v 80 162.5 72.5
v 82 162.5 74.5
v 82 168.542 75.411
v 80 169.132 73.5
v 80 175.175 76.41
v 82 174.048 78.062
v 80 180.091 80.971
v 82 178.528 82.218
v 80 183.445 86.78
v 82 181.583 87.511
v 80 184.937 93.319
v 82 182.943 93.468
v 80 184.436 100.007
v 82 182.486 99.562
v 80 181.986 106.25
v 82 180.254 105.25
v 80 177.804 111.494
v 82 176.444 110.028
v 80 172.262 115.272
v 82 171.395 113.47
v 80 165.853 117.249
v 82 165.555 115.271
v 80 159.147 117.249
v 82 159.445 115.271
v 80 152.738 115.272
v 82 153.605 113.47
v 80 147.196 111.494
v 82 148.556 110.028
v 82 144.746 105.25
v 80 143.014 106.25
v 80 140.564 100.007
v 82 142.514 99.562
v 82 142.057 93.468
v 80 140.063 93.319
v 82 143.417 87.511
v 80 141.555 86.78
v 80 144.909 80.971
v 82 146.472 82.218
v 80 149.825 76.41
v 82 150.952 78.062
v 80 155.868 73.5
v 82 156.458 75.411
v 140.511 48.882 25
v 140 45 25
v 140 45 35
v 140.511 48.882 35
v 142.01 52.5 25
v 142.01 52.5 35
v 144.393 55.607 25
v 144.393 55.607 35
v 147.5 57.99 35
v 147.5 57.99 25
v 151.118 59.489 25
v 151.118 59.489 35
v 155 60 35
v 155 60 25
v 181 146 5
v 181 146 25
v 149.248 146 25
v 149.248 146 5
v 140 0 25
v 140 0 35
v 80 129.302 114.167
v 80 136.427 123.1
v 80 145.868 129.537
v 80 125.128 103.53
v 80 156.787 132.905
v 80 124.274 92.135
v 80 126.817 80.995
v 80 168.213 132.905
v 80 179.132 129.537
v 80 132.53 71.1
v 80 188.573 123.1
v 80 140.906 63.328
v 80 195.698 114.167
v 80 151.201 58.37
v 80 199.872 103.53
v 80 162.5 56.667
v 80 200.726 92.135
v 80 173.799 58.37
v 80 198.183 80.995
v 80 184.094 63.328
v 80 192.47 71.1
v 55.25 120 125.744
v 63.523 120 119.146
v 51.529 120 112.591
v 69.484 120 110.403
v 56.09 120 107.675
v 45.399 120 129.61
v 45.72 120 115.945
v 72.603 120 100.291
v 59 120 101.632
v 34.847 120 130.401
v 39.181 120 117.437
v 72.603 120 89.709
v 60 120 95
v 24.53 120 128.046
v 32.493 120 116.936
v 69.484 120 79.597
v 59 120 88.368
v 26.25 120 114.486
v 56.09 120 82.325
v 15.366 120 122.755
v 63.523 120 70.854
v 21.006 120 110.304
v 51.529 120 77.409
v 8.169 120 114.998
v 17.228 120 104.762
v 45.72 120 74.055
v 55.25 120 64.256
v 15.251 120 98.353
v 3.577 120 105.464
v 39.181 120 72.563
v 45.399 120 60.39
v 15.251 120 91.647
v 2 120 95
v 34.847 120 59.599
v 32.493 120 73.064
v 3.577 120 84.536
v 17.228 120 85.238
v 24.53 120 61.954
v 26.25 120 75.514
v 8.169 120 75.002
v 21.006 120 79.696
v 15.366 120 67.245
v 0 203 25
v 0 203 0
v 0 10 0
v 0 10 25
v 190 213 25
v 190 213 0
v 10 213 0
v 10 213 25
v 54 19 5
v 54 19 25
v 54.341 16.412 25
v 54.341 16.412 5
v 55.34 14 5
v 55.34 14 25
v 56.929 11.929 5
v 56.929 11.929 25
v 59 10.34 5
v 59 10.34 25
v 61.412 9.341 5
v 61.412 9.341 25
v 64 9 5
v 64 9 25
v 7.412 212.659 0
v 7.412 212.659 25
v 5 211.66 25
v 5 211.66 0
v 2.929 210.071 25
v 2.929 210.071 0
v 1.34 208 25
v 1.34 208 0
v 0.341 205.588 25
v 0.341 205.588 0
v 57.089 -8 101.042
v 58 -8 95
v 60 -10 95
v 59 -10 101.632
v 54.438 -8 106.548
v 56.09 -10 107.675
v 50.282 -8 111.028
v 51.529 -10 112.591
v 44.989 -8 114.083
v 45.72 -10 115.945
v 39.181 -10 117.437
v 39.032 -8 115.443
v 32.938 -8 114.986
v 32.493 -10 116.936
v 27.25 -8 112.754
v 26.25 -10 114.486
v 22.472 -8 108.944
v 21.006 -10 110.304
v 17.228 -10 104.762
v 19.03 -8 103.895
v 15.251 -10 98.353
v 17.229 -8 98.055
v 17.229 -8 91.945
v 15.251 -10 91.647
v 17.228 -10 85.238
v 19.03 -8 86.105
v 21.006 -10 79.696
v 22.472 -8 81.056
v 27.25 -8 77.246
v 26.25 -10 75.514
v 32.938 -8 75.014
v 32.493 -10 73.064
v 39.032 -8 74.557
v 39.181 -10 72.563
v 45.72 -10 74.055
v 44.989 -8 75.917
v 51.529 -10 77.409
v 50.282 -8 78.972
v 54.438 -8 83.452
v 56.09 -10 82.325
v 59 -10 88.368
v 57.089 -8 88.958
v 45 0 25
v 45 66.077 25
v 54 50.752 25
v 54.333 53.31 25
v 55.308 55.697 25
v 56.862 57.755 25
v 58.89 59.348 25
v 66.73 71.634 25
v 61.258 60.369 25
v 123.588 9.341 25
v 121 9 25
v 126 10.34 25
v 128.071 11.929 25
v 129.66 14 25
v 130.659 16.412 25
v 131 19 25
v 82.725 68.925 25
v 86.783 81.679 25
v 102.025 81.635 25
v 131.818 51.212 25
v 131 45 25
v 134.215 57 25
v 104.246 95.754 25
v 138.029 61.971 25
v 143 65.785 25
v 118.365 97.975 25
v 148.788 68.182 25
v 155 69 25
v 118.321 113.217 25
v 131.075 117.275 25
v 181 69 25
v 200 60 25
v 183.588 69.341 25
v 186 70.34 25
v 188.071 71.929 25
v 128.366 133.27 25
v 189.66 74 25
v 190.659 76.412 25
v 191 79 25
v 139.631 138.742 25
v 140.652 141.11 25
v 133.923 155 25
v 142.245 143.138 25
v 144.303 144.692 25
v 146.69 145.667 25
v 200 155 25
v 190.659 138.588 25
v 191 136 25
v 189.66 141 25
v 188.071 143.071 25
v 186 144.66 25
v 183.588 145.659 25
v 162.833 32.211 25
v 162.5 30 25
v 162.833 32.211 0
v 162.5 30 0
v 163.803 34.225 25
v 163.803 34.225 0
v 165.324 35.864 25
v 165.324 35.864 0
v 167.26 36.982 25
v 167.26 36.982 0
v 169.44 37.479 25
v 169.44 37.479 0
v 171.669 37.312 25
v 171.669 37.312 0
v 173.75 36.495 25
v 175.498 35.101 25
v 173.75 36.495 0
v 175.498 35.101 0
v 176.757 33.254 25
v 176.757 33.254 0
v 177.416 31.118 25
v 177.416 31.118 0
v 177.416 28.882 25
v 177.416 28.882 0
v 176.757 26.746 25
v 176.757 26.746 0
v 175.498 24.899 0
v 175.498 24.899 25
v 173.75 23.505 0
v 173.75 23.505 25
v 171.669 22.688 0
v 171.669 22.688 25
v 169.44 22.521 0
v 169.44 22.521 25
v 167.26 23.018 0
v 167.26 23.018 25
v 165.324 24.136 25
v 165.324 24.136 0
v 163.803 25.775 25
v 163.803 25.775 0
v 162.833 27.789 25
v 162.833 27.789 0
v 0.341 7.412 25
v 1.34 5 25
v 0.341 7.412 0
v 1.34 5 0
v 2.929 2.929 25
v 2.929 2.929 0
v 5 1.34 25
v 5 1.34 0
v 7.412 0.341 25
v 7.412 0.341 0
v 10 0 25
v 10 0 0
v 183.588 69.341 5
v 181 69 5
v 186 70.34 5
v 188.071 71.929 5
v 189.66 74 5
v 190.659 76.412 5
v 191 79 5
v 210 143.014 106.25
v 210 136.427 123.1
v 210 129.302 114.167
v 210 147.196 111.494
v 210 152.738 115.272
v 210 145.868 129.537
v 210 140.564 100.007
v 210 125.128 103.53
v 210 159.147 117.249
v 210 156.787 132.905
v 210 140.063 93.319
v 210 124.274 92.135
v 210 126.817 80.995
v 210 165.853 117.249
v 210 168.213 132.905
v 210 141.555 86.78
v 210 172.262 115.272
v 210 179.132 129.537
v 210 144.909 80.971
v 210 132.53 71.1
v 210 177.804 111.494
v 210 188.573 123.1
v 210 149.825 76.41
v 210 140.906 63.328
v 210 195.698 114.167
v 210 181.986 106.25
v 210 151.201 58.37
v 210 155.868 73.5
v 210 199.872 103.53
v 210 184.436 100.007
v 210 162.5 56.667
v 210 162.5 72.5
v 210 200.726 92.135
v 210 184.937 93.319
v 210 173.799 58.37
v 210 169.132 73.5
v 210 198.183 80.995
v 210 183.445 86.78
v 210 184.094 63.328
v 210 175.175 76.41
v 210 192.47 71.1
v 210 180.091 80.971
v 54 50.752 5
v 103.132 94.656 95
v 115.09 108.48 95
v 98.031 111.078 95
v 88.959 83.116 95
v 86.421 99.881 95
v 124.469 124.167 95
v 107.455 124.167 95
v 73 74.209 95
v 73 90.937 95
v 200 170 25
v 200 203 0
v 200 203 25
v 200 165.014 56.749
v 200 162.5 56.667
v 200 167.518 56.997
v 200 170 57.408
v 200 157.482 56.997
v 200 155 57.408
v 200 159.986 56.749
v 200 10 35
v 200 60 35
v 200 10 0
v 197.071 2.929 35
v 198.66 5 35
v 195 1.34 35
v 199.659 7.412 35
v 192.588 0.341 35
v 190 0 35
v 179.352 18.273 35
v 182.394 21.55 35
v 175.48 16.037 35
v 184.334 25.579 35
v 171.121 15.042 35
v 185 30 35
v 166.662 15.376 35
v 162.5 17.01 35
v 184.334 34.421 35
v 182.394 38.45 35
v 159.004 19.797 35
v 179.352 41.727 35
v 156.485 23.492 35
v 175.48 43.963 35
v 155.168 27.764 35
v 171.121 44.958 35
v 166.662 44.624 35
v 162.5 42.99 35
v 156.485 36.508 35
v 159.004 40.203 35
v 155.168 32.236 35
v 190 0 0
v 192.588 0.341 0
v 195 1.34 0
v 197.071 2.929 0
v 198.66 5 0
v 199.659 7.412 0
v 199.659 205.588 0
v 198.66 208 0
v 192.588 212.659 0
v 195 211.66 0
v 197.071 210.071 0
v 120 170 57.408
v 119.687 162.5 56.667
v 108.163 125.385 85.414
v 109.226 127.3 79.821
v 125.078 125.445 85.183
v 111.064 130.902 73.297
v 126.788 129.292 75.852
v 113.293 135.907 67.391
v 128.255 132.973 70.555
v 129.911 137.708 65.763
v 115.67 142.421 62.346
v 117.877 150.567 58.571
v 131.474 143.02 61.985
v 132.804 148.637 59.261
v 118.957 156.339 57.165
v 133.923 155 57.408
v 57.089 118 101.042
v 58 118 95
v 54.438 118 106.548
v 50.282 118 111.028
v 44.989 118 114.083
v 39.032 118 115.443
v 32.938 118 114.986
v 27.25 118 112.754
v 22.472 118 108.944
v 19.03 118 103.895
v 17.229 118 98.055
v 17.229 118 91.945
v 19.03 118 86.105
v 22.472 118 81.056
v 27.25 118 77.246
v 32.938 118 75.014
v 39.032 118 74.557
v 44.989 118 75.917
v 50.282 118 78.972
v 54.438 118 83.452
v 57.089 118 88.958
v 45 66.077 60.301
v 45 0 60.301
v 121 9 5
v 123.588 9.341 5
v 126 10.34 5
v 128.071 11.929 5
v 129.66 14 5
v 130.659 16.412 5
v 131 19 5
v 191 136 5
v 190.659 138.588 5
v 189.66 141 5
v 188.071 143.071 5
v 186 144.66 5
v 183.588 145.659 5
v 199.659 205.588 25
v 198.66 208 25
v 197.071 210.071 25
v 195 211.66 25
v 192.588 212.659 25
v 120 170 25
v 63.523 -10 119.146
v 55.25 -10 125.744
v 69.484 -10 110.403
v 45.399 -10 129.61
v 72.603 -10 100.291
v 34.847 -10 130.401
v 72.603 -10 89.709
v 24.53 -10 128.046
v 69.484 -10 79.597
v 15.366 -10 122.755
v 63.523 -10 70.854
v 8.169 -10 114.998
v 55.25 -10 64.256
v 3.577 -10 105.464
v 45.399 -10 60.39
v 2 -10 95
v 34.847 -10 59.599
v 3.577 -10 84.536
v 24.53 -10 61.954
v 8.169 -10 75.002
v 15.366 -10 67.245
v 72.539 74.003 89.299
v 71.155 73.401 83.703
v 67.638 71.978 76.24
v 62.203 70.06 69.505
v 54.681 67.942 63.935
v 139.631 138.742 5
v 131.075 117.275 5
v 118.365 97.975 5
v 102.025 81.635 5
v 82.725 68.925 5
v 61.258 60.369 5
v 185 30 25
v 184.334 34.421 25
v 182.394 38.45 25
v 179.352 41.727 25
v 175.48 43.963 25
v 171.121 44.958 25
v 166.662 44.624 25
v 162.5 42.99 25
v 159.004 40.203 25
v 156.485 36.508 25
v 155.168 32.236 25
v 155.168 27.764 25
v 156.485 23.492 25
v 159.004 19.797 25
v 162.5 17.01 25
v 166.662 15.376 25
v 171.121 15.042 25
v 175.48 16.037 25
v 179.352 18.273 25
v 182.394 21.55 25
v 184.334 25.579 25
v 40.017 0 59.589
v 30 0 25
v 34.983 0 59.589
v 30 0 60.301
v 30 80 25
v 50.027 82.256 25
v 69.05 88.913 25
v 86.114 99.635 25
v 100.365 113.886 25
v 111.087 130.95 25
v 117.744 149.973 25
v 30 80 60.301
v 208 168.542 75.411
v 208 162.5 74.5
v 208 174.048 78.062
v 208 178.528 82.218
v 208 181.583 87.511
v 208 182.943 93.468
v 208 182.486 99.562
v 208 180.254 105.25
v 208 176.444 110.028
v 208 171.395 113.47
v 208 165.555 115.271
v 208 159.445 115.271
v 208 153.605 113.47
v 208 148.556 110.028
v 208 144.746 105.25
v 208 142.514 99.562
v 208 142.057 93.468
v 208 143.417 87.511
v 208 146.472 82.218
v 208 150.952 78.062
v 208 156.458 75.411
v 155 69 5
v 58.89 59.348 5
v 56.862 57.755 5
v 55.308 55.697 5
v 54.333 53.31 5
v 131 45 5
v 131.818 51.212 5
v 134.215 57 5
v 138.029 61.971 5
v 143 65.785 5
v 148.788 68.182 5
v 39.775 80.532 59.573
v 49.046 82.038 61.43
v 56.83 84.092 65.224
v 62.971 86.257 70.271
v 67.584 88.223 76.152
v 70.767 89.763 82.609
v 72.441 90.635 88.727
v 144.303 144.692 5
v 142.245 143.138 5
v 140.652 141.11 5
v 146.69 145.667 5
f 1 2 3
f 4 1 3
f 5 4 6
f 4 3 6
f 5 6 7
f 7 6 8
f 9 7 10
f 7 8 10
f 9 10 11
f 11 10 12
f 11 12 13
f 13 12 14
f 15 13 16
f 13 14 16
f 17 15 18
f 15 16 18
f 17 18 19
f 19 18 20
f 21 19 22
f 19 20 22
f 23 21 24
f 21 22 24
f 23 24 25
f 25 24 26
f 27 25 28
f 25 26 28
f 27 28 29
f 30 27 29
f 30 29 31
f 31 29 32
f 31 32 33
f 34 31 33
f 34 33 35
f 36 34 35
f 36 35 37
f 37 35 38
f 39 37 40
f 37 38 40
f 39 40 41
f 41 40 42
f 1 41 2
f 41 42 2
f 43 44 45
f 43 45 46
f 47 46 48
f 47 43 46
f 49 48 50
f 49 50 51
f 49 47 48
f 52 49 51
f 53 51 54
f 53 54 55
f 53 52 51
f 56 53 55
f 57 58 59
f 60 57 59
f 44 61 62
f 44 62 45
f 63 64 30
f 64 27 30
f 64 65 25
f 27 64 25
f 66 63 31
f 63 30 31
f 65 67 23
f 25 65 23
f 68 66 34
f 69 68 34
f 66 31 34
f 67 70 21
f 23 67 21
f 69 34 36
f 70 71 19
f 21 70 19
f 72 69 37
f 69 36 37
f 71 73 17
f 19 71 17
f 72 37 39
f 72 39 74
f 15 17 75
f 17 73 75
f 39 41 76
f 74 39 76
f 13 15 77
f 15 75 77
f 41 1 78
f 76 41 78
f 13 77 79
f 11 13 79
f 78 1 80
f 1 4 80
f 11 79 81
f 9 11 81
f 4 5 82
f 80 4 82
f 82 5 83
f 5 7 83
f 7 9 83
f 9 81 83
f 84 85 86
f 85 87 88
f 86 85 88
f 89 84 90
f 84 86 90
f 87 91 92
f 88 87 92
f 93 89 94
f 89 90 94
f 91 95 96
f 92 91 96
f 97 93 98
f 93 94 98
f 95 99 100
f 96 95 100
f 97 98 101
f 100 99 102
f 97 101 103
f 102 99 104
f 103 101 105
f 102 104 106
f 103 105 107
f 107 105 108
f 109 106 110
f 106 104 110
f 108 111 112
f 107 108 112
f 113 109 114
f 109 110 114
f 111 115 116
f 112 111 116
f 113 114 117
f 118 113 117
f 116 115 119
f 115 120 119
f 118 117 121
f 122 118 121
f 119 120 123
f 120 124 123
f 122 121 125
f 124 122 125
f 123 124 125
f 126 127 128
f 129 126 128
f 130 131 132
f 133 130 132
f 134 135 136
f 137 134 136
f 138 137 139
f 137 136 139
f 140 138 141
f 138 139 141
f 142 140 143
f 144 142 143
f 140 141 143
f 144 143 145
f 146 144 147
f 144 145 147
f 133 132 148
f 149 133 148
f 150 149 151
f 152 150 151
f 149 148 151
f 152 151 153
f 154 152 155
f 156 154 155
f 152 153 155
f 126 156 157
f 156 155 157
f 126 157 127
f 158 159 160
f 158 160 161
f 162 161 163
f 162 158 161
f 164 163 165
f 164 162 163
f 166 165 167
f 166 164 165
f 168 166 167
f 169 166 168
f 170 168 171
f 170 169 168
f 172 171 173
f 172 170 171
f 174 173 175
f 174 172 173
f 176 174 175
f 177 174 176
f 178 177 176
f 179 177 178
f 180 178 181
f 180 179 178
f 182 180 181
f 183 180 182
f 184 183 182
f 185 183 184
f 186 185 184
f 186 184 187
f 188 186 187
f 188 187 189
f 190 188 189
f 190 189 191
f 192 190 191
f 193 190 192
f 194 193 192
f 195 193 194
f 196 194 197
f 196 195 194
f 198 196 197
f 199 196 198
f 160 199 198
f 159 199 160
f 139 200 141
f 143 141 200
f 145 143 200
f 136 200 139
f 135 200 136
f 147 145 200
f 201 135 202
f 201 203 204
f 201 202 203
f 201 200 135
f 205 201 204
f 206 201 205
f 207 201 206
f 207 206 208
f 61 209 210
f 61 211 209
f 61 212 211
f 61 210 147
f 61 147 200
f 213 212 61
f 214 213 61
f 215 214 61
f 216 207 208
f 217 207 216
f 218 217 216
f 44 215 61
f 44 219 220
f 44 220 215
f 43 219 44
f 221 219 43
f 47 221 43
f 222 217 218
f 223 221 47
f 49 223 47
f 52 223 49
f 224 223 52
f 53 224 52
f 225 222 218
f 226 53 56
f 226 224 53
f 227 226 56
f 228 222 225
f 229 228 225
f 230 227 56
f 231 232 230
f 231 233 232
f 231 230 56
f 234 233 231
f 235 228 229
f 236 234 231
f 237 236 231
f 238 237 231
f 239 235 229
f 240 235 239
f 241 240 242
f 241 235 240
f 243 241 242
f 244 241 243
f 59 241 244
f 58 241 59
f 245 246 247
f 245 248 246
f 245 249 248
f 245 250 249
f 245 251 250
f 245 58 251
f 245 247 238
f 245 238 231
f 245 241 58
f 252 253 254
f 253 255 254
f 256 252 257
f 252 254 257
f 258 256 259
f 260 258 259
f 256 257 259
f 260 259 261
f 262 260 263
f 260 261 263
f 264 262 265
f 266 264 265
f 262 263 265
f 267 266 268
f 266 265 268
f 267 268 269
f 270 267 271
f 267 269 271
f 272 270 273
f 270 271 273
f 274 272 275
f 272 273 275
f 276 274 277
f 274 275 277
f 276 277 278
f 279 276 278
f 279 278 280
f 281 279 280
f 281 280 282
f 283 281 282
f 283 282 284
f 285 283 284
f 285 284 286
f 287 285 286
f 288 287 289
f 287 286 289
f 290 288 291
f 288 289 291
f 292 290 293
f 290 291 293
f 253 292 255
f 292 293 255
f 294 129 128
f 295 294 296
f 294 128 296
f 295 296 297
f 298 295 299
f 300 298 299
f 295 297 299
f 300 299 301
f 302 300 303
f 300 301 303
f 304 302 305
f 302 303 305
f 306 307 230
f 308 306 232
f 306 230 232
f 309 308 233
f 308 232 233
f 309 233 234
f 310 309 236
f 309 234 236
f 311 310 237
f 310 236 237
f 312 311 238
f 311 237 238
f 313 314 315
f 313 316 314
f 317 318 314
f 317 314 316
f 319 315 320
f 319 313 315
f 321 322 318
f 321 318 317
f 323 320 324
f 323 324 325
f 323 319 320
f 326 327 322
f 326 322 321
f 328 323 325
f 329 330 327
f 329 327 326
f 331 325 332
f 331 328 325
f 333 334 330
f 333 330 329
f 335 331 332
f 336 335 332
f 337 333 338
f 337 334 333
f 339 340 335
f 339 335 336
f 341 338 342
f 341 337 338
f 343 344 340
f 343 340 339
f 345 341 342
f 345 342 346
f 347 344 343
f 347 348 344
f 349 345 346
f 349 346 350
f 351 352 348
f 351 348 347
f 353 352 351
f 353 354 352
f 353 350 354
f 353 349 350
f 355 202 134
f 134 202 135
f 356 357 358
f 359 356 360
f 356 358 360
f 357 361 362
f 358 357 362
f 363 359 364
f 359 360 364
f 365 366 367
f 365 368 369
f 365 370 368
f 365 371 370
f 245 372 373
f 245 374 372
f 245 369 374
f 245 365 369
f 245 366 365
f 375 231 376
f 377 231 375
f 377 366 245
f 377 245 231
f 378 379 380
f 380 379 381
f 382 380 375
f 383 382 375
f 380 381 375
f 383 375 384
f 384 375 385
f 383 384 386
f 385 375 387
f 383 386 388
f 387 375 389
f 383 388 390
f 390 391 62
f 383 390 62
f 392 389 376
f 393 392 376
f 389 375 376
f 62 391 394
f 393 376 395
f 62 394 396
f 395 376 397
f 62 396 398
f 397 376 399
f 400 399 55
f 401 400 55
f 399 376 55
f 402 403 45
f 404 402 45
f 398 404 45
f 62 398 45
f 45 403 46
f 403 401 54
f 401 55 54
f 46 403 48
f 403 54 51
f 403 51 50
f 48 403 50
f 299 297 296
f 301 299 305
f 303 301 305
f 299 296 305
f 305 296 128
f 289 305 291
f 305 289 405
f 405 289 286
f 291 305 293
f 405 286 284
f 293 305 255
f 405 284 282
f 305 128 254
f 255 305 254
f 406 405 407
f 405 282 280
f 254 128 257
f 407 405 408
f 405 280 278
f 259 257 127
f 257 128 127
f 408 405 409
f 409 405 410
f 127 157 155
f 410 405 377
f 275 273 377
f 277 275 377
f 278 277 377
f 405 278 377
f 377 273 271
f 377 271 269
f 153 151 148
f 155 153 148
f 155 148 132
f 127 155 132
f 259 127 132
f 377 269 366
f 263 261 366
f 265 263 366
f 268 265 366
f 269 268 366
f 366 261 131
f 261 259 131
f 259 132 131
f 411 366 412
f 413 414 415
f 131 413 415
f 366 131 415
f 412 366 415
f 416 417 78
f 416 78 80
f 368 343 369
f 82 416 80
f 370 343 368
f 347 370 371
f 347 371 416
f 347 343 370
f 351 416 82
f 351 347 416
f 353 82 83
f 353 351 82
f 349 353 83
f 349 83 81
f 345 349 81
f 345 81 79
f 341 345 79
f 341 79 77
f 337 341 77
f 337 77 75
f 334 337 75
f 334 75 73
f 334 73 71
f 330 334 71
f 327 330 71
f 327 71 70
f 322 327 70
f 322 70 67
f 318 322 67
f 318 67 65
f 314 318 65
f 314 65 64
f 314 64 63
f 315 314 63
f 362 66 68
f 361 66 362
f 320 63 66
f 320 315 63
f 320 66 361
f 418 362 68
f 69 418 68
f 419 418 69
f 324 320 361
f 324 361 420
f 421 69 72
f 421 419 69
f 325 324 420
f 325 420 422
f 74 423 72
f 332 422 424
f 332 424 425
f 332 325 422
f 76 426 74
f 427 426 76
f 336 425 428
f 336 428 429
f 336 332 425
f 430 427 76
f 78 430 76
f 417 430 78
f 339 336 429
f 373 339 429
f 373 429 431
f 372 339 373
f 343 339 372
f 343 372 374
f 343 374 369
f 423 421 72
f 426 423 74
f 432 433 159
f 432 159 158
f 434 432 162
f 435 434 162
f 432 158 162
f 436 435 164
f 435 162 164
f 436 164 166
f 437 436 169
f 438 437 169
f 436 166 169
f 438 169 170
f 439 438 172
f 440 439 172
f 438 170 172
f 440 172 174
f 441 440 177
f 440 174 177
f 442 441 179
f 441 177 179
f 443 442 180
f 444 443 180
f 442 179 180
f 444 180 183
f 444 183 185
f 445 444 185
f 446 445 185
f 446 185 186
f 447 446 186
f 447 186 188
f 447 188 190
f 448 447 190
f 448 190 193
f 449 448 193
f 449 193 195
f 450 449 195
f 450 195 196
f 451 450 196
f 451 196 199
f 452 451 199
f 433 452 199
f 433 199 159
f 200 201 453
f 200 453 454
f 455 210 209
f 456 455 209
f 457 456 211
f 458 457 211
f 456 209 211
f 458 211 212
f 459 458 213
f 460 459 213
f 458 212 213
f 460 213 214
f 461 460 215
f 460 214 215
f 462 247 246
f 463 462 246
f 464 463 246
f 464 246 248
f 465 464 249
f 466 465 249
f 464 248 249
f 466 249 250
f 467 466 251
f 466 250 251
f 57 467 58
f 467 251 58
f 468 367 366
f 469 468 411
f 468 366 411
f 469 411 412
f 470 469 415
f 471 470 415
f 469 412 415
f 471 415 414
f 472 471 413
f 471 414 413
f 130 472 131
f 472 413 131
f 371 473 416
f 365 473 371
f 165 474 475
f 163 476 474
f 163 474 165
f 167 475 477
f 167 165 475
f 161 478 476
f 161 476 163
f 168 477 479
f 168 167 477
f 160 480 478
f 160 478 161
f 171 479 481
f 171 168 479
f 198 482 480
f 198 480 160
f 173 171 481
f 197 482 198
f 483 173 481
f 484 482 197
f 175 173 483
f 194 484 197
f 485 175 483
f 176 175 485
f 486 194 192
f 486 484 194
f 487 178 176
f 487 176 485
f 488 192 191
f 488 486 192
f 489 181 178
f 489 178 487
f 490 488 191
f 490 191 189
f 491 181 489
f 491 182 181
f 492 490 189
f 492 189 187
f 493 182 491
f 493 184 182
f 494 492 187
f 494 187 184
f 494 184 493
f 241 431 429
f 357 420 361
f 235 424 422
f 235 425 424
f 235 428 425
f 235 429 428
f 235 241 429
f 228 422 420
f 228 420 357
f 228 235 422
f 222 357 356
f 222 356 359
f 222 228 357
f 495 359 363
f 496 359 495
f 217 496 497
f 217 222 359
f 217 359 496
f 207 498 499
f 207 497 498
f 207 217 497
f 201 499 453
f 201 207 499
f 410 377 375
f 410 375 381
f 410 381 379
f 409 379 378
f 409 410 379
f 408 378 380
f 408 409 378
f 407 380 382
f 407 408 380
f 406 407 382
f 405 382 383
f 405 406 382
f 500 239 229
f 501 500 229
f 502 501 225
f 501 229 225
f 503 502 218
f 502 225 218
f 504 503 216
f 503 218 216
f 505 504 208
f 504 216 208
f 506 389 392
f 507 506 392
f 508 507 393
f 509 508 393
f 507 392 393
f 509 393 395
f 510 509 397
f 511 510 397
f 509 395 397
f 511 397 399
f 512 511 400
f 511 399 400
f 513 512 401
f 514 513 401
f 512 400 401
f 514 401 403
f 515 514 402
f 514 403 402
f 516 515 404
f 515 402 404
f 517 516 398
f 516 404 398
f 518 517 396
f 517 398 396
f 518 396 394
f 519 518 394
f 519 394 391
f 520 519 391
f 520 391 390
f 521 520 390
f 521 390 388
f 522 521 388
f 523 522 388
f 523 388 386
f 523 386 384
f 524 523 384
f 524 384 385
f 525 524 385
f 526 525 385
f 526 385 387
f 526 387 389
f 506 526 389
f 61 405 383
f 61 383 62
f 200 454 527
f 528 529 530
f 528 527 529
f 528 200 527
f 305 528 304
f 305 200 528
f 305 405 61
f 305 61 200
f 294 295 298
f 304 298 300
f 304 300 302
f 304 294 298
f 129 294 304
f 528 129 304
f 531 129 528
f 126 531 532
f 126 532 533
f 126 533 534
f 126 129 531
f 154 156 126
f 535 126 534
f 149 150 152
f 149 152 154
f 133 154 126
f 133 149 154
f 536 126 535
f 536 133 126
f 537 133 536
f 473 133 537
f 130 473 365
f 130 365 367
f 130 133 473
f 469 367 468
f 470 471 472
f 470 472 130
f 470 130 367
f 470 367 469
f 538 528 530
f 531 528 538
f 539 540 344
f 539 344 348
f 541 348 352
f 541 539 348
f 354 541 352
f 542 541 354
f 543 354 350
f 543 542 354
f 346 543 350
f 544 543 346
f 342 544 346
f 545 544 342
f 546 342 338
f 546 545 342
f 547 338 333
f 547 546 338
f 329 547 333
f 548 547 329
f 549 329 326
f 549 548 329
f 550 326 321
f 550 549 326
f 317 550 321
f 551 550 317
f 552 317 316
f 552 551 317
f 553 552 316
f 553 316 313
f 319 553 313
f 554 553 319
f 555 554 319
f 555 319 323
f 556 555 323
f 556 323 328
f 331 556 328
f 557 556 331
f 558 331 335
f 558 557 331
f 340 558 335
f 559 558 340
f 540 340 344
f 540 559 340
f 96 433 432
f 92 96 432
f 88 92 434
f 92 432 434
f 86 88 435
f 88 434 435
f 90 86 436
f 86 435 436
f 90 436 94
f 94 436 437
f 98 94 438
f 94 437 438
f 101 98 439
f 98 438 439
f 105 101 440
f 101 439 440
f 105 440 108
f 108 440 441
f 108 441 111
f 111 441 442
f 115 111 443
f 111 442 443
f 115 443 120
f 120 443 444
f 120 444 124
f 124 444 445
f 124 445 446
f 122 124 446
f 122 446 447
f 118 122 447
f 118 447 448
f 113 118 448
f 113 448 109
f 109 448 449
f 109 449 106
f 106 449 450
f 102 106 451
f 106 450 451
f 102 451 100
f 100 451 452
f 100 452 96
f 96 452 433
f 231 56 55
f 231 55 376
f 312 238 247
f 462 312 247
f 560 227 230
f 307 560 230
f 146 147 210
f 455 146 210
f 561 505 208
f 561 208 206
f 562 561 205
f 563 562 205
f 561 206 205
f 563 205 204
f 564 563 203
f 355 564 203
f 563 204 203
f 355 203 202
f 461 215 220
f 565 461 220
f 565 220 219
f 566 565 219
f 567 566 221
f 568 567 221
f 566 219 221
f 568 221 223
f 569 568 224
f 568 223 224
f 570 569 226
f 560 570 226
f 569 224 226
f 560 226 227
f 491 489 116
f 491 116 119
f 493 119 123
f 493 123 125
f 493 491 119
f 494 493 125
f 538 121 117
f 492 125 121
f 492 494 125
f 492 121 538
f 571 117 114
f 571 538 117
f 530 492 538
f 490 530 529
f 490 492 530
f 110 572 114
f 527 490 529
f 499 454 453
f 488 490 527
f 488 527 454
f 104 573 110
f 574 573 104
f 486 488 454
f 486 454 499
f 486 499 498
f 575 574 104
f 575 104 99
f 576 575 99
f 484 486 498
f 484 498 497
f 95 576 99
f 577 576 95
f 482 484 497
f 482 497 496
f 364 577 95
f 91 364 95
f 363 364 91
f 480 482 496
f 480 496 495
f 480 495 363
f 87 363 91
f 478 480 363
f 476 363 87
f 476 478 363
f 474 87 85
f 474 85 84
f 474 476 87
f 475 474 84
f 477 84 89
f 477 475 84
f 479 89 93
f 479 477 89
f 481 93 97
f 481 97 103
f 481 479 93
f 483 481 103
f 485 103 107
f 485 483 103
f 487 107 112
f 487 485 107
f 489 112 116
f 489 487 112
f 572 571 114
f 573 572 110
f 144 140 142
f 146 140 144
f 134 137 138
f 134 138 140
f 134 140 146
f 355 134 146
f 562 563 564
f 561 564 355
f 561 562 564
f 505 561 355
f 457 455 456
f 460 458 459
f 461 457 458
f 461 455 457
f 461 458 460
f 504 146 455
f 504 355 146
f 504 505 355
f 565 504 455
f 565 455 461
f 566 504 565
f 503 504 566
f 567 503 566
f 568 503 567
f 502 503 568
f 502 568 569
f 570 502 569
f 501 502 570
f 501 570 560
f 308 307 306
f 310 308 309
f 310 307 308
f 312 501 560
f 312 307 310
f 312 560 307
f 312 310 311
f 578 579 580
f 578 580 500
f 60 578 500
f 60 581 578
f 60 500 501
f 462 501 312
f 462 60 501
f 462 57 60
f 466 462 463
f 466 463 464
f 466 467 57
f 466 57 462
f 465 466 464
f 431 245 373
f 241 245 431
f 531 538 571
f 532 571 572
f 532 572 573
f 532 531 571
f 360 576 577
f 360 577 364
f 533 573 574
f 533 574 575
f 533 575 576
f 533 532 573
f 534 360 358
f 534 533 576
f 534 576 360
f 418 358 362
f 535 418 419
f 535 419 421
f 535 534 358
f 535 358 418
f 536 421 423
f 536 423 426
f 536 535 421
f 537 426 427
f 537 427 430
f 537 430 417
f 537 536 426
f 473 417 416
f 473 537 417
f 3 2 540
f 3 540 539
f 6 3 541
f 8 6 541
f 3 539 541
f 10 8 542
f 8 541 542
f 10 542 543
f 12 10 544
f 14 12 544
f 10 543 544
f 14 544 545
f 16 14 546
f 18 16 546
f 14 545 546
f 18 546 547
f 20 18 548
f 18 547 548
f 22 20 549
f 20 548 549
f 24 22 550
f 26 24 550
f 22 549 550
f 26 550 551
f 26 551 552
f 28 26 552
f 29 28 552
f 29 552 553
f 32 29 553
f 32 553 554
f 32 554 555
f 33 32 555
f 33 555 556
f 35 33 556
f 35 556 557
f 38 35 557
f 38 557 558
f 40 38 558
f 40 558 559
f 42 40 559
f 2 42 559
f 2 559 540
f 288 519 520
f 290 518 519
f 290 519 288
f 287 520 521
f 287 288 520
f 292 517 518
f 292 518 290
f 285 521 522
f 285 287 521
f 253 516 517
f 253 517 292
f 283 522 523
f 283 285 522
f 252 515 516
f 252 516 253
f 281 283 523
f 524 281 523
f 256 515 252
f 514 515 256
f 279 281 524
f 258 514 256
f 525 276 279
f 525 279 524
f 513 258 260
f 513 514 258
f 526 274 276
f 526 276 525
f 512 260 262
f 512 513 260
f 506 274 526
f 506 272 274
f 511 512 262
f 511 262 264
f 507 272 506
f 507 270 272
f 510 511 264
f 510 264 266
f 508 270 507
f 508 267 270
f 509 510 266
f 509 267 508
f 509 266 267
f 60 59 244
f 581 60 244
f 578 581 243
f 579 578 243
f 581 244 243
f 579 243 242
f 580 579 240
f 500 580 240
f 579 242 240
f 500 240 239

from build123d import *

# Parameters (mm, degrees)
BOSS_EXTRUDE1_DEPTH                     = 25
BOSS_EXTRUDE2_DEPTH                     = 10
CBORE_FOR_M8_HEX_HEAD_BOLT1_D           = 15
CBORE_FOR_M8_HEX_HEAD_BOLT1_CBORE_D     = 30
CBORE_FOR_M8_HEX_HEAD_BOLT1_CBORE_DEPTH = 10
BOSS_EXTRUDE3_DEPTH                     = 70
CUT_EXTRUDE1_DEPTH                      = 20
SKETCH7_R                               = 35.5
BOSS_EXTRUDE4_DEPTH                     = 130
SKETCH8_R                               = 20.5
CUT_EXTRUDE2_DEPTH                      = 224
SKETCH9_R                               = 38.333333333
BOSS_EXTRUDE5_DEPTH                     = 130
SKETCH10_R                              = 20.5
CUT_EXTRUDE3_DEPTH                      = 211
CHAMFER1_SIZE                           = 2


with BuildPart() as part:
    # Sketch1 → Boss-Extrude1 (new body)
    with BuildSketch(Plane.XY):
        with BuildLine():
            Line((10, 0), (190, 0))
            ThreePointArc((190, 0), (197.071067812, 2.928932188), (200, 10))
            Line((200, 10), (200, 203))
            ThreePointArc((200, 203), (197.071067812, 210.071067812), (190, 213))
            Line((190, 213), (10, 213))
            ThreePointArc((10, 213), (2.928932188, 210.071067812), (0, 203))
            Line((0, 203), (0, 10))
            ThreePointArc((0, 10), (2.928932188, 2.928932188), (10, 0))
        make_face()
    extrude(amount=BOSS_EXTRUDE1_DEPTH)

    # Sketch2 → Boss-Extrude2 (add)
    with BuildSketch(Plane.XY.offset(25)):
        with BuildLine():
            Line((200, 60), (200, 10))
            ThreePointArc((200, 10), (197.071067812, 2.928932188), (190, 0))
            Line((190, 0), (140, 0))
            Line((140, 0), (140, 45))
            ThreePointArc((140, 45), (144.393398282, 55.606601718), (155, 60))
            Line((155, 60), (200, 60))
        make_face()
    extrude(amount=BOSS_EXTRUDE2_DEPTH)

    # CBORE for M8 Hex Head Bolt1 (through all)
    with Locations(Plane.XY.offset(35)):
        with Locations((170, 30)):
            CounterBoreHole(CBORE_FOR_M8_HEX_HEAD_BOLT1_D / 2, CBORE_FOR_M8_HEX_HEAD_BOLT1_CBORE_D / 2, CBORE_FOR_M8_HEX_HEAD_BOLT1_CBORE_DEPTH)

    # Sketch5 → Boss-Extrude3 (add)
    with BuildSketch(Plane.XY.offset(25)):
        with BuildLine():
            Line((30, 0), (30, 80))
            ThreePointArc((30, 80), (93.639610307, 106.360389693), (120, 170))
            Line((120, 170), (200, 170))
            Line((200, 170), (200, 155))
            Line((200, 155), (133.923048454, 155))
            ThreePointArc((133.923048454, 155), (104.246212025, 95.753787975), (45, 66.076951546))
            Line((45, 66.076951546), (45, 0))
            Line((45, 0), (30, 0))
        make_face()
    extrude(amount=BOSS_EXTRUDE3_DEPTH)

    # Sketch6 → Cut-Extrude1 (cut)
    with BuildSketch(Plane.XY.offset(25)):
        with BuildLine():
            Line((54, 50.752358514), (54, 19))
            ThreePointArc((54, 19), (56.928932188, 11.928932188), (64, 9))
            Line((64, 9), (121, 9))
            ThreePointArc((121, 9), (128.071067812, 11.928932188), (131, 19))
            Line((131, 19), (131, 45))
            ThreePointArc((131, 45), (138.029437252, 61.970562748), (155, 69))
            Line((155, 69), (181, 69))
            ThreePointArc((181, 69), (188.071067812, 71.928932188), (191, 79))
            Line((191, 79), (191, 136))
            ThreePointArc((191, 136), (188.071067812, 143.071067812), (181, 146))
            Line((181, 146), (149.247641486, 146))
            ThreePointArc((149.247641486, 146), (143.223496519, 143.981834214), (139.630896205, 138.741935484))
            ThreePointArc((139.630896205, 138.741935484), (110.610173055, 89.389826945), (61.258064516, 60.369103795))
            ThreePointArc((61.258064516, 60.369103795), (56.018165786, 56.776503481), (54, 50.752358514))
        make_face()
    extrude(amount=-CUT_EXTRUDE1_DEPTH, mode=Mode.SUBTRACT)

    # Sketch7 → Boss-Extrude4 (add)
    with BuildSketch(Plane(origin=(0, -10, 0), x_dir=(-1, 0, 0), z_dir=(0, -1, 0))):
        with Locations((-37.5, -95)):
            Circle(SKETCH7_R)
    extrude(amount=-BOSS_EXTRUDE4_DEPTH)

    # Sketch8 → Cut-Extrude2 (cut, through all)
    with BuildSketch(Plane.XZ.offset(10)):
        with Locations((37.5, 95)):
            Circle(SKETCH8_R)
    extrude(amount=-CUT_EXTRUDE2_DEPTH, mode=Mode.SUBTRACT)

    # Sketch9 → Boss-Extrude5 (add)
    with BuildSketch(Plane(origin=(210, 0, 0), x_dir=(0, 0, -1), z_dir=(1, 0, 0))):
        with Locations((-95, 162.5)):
            Circle(SKETCH9_R)
    extrude(amount=-BOSS_EXTRUDE5_DEPTH)

    # Sketch10 → Cut-Extrude3 (cut, through all)
    with BuildSketch(Plane(origin=(210, 0, 0), x_dir=(0, 0, -1), z_dir=(1, 0, 0))):
        with Locations((-95, 162.5)):
            Circle(SKETCH10_R)
    extrude(amount=-CUT_EXTRUDE3_DEPTH, mode=Mode.SUBTRACT)

    # Chamfer1
    chamfer1_edges = [part.edges().sort_by_distance(p)[0] for p in [
        (17, 120, 95),
        (17, -10, 95),
        (80, 162.5, 115.5),
        (210, 162.5, 115.5),
    ]]
    chamfer(chamfer1_edges, length=CHAMFER1_SIZE)


solid = part.part
